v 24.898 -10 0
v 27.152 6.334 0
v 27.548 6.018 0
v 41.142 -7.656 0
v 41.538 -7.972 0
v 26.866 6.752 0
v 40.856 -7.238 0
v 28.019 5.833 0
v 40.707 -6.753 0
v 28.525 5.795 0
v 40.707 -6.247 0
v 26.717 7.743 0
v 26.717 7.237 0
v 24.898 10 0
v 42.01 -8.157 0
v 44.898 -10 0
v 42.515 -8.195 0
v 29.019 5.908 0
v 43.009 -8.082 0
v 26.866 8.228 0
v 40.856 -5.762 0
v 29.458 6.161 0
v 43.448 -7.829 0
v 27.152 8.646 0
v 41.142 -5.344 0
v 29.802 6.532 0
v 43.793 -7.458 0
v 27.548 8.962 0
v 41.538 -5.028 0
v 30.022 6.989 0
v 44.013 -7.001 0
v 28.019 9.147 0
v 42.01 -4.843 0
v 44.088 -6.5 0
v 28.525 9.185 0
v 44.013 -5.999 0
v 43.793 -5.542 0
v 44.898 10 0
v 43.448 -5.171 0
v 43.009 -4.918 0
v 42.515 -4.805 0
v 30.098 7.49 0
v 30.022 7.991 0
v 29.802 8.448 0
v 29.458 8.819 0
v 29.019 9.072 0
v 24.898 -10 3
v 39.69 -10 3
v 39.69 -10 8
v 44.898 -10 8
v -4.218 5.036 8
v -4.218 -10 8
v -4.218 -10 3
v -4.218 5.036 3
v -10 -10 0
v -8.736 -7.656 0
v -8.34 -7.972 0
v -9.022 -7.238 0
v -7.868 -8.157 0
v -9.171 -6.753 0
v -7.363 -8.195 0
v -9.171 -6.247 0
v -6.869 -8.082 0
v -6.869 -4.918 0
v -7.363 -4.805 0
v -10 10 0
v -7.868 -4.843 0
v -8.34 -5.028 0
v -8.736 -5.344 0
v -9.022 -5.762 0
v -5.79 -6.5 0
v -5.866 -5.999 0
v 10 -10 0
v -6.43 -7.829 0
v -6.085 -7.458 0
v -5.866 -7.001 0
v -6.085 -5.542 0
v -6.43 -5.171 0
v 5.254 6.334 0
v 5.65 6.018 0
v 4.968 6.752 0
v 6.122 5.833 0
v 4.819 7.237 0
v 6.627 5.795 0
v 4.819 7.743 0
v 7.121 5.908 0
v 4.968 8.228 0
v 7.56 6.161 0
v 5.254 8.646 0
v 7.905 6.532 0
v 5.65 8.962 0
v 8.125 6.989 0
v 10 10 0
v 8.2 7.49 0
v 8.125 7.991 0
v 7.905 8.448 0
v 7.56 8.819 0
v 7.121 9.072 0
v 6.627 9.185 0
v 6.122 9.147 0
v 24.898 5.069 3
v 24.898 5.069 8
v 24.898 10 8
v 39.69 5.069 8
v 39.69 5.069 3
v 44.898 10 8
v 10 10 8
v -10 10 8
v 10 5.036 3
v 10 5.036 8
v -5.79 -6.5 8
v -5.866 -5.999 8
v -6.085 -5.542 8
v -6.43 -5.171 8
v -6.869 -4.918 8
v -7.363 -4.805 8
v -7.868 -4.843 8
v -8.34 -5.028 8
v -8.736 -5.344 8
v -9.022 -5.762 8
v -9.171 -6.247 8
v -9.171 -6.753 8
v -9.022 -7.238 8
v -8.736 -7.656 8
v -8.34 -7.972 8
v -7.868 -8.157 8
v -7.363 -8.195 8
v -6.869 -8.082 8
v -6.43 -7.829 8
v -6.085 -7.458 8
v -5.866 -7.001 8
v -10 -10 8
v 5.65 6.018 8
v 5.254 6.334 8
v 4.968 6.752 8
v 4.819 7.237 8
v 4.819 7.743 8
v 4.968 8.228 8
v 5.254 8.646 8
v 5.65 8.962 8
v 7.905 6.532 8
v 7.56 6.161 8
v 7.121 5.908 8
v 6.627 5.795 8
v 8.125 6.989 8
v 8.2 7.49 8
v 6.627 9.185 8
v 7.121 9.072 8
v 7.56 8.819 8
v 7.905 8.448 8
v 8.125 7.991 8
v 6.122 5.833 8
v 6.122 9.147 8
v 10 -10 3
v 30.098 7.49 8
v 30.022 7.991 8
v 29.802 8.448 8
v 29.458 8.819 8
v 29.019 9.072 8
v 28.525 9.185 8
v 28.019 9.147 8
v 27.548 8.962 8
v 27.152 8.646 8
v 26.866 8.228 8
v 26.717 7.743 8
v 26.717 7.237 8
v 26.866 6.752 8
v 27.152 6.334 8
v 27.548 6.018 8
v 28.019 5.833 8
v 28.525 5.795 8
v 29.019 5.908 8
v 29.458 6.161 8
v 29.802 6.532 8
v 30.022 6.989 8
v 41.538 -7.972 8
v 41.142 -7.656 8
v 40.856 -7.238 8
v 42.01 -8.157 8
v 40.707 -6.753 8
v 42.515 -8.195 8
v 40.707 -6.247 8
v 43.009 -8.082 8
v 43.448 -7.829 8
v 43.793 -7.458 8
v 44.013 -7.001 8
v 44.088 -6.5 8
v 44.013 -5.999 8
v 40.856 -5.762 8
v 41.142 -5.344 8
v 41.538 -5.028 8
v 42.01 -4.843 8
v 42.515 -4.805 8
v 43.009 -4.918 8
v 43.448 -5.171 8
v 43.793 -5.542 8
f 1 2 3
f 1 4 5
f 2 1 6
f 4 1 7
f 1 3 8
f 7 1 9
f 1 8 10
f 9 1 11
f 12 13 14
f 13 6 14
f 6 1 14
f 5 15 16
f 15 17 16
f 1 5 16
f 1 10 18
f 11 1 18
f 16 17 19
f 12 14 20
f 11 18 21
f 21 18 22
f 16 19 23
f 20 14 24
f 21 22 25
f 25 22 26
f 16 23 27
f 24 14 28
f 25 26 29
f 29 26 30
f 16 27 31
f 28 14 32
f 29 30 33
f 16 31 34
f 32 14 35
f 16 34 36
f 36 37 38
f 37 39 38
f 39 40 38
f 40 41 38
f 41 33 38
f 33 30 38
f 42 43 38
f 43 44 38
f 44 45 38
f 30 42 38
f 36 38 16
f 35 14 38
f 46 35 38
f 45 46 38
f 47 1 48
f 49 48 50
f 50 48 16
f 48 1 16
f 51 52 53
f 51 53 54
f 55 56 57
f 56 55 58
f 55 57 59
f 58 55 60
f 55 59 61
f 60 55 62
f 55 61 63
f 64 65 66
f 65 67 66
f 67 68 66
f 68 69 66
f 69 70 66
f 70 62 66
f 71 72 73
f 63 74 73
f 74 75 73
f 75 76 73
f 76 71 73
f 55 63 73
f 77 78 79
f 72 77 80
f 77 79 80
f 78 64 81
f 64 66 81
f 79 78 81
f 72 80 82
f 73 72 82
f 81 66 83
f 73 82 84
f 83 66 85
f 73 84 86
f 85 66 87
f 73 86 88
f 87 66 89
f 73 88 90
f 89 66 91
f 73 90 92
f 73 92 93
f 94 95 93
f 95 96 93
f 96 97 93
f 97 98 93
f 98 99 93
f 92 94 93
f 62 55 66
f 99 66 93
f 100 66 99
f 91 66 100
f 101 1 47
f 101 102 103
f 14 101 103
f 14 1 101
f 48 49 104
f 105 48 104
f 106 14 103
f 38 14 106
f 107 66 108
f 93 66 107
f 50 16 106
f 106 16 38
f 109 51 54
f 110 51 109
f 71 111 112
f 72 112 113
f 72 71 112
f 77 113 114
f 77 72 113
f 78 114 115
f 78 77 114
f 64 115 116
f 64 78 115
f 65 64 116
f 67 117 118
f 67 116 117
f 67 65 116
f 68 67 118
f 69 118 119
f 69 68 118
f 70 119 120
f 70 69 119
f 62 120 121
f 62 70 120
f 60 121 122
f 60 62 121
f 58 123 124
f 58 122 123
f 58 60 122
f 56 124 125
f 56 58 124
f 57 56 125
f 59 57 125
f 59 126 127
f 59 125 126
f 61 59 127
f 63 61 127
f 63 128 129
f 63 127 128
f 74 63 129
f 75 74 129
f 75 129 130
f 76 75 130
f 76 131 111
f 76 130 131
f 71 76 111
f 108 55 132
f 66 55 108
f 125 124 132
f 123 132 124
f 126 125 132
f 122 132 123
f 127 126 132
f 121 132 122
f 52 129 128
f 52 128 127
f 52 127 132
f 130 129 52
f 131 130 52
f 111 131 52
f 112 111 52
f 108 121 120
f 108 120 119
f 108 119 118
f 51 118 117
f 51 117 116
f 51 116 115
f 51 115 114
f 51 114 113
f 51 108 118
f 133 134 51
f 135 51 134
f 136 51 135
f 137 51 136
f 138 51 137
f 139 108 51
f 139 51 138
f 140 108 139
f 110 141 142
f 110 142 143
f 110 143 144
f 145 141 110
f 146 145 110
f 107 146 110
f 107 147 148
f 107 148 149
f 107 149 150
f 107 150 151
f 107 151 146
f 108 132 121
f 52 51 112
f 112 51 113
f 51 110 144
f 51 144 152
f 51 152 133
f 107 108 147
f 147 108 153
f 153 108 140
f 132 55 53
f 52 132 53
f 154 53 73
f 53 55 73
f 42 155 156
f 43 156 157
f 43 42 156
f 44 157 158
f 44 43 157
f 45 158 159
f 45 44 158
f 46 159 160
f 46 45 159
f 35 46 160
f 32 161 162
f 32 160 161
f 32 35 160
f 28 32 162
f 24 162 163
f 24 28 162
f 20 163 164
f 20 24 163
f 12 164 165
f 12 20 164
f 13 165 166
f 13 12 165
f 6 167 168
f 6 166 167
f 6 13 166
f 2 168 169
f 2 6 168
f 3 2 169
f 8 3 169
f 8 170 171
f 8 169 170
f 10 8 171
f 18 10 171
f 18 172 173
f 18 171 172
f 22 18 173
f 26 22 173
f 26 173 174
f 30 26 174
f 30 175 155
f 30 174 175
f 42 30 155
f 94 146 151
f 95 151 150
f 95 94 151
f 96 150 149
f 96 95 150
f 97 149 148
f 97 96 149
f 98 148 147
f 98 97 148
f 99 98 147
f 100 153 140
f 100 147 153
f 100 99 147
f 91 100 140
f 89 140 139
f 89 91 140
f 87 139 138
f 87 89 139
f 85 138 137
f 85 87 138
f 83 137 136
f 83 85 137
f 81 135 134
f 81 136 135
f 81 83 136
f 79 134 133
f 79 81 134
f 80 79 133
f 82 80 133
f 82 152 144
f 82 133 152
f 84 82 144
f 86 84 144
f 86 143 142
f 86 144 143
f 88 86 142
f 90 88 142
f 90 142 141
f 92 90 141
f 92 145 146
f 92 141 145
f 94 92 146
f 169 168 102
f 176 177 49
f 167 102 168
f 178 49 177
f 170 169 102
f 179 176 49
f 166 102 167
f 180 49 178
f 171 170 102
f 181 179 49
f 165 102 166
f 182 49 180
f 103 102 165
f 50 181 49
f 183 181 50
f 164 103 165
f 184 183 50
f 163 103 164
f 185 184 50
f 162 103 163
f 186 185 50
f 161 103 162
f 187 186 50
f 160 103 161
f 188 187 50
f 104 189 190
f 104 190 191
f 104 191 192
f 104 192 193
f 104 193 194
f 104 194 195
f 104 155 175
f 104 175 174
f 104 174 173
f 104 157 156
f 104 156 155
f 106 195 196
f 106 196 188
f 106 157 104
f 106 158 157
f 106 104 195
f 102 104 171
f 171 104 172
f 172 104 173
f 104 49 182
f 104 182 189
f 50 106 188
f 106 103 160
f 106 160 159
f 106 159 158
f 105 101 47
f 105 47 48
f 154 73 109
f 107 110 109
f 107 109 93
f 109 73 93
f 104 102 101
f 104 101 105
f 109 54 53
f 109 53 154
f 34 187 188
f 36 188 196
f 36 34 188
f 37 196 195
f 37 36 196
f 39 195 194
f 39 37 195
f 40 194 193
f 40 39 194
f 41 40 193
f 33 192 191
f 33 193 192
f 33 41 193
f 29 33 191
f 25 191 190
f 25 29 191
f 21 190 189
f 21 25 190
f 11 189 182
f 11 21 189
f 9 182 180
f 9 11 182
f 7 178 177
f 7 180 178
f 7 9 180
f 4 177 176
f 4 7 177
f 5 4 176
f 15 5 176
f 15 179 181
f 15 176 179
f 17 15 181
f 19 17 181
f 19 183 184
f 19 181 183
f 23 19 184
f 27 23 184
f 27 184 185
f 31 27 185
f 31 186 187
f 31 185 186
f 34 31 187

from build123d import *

# Parameters (mm, degrees)
F0_W     = 20
F0_H     = 20
F1_DEPTH = 8
F2_W     = 14.218063
F2_H     = 15.036273
F3_DEPTH = 5
F4_W     = 20
F4_H     = 20
F5_DEPTH = 8
F6_W     = 14.792317
F6_H     = 15.069305
F7_DEPTH = 5
F8_R     = 1.7
F9_DEPTH = 8.6


with BuildPart() as f1:
    # F0 (on Top) → F1 (new body)
    with BuildSketch(Plane.XY):
        Rectangle(F0_W, F0_H)
    extrude(amount=F1_DEPTH)

    # F2 (on face) → F3 (cut)
    with BuildSketch(Plane.XY.offset(8)):
        with Locations((2.890969, -2.481864)):
            Rectangle(F2_W, F2_H)
    extrude(amount=-F3_DEPTH, mode=Mode.SUBTRACT)


with BuildPart() as f5:
    # F4 (on Top) → F5 (new body)
    with BuildSketch(Plane.XY):
        with Locations((34.897734, 0)):
            Rectangle(F4_W, F4_H)
    extrude(amount=F5_DEPTH)

    # F6 (on face) → F7 (cut)
    with BuildSketch(Plane.XY.offset(8)):
        with Locations((32.293892, -2.465348)):
            Rectangle(F6_W, F6_H)
    extrude(amount=-F7_DEPTH, mode=Mode.SUBTRACT)


with BuildPart() as f9_tool:
    # F8 (on Top) → F9 (new body)
    with BuildSketch(Plane.XY):
        with Locations((-7.49, -6.5)):
            Circle(F8_R)
        with Locations((6.500113, 7.49)):
            Circle(F8_R)
        with Locations((28.397734, 7.49)):
            Circle(F8_R)
        with Locations((42.388041, -6.5)):
            Circle(F8_R)
    extrude(amount=F9_DEPTH)


with BuildPart() as f1_1:
    add(f1.part)

    # F9: cut by f9_tool
    add(f9_tool.part, mode=Mode.SUBTRACT)


with BuildPart() as f5_1:
    add(f5.part)

    # F9: cut by f9_tool
    add(f9_tool.part, mode=Mode.SUBTRACT)


solid = Compound([f1_1.part, f5_1.part])
